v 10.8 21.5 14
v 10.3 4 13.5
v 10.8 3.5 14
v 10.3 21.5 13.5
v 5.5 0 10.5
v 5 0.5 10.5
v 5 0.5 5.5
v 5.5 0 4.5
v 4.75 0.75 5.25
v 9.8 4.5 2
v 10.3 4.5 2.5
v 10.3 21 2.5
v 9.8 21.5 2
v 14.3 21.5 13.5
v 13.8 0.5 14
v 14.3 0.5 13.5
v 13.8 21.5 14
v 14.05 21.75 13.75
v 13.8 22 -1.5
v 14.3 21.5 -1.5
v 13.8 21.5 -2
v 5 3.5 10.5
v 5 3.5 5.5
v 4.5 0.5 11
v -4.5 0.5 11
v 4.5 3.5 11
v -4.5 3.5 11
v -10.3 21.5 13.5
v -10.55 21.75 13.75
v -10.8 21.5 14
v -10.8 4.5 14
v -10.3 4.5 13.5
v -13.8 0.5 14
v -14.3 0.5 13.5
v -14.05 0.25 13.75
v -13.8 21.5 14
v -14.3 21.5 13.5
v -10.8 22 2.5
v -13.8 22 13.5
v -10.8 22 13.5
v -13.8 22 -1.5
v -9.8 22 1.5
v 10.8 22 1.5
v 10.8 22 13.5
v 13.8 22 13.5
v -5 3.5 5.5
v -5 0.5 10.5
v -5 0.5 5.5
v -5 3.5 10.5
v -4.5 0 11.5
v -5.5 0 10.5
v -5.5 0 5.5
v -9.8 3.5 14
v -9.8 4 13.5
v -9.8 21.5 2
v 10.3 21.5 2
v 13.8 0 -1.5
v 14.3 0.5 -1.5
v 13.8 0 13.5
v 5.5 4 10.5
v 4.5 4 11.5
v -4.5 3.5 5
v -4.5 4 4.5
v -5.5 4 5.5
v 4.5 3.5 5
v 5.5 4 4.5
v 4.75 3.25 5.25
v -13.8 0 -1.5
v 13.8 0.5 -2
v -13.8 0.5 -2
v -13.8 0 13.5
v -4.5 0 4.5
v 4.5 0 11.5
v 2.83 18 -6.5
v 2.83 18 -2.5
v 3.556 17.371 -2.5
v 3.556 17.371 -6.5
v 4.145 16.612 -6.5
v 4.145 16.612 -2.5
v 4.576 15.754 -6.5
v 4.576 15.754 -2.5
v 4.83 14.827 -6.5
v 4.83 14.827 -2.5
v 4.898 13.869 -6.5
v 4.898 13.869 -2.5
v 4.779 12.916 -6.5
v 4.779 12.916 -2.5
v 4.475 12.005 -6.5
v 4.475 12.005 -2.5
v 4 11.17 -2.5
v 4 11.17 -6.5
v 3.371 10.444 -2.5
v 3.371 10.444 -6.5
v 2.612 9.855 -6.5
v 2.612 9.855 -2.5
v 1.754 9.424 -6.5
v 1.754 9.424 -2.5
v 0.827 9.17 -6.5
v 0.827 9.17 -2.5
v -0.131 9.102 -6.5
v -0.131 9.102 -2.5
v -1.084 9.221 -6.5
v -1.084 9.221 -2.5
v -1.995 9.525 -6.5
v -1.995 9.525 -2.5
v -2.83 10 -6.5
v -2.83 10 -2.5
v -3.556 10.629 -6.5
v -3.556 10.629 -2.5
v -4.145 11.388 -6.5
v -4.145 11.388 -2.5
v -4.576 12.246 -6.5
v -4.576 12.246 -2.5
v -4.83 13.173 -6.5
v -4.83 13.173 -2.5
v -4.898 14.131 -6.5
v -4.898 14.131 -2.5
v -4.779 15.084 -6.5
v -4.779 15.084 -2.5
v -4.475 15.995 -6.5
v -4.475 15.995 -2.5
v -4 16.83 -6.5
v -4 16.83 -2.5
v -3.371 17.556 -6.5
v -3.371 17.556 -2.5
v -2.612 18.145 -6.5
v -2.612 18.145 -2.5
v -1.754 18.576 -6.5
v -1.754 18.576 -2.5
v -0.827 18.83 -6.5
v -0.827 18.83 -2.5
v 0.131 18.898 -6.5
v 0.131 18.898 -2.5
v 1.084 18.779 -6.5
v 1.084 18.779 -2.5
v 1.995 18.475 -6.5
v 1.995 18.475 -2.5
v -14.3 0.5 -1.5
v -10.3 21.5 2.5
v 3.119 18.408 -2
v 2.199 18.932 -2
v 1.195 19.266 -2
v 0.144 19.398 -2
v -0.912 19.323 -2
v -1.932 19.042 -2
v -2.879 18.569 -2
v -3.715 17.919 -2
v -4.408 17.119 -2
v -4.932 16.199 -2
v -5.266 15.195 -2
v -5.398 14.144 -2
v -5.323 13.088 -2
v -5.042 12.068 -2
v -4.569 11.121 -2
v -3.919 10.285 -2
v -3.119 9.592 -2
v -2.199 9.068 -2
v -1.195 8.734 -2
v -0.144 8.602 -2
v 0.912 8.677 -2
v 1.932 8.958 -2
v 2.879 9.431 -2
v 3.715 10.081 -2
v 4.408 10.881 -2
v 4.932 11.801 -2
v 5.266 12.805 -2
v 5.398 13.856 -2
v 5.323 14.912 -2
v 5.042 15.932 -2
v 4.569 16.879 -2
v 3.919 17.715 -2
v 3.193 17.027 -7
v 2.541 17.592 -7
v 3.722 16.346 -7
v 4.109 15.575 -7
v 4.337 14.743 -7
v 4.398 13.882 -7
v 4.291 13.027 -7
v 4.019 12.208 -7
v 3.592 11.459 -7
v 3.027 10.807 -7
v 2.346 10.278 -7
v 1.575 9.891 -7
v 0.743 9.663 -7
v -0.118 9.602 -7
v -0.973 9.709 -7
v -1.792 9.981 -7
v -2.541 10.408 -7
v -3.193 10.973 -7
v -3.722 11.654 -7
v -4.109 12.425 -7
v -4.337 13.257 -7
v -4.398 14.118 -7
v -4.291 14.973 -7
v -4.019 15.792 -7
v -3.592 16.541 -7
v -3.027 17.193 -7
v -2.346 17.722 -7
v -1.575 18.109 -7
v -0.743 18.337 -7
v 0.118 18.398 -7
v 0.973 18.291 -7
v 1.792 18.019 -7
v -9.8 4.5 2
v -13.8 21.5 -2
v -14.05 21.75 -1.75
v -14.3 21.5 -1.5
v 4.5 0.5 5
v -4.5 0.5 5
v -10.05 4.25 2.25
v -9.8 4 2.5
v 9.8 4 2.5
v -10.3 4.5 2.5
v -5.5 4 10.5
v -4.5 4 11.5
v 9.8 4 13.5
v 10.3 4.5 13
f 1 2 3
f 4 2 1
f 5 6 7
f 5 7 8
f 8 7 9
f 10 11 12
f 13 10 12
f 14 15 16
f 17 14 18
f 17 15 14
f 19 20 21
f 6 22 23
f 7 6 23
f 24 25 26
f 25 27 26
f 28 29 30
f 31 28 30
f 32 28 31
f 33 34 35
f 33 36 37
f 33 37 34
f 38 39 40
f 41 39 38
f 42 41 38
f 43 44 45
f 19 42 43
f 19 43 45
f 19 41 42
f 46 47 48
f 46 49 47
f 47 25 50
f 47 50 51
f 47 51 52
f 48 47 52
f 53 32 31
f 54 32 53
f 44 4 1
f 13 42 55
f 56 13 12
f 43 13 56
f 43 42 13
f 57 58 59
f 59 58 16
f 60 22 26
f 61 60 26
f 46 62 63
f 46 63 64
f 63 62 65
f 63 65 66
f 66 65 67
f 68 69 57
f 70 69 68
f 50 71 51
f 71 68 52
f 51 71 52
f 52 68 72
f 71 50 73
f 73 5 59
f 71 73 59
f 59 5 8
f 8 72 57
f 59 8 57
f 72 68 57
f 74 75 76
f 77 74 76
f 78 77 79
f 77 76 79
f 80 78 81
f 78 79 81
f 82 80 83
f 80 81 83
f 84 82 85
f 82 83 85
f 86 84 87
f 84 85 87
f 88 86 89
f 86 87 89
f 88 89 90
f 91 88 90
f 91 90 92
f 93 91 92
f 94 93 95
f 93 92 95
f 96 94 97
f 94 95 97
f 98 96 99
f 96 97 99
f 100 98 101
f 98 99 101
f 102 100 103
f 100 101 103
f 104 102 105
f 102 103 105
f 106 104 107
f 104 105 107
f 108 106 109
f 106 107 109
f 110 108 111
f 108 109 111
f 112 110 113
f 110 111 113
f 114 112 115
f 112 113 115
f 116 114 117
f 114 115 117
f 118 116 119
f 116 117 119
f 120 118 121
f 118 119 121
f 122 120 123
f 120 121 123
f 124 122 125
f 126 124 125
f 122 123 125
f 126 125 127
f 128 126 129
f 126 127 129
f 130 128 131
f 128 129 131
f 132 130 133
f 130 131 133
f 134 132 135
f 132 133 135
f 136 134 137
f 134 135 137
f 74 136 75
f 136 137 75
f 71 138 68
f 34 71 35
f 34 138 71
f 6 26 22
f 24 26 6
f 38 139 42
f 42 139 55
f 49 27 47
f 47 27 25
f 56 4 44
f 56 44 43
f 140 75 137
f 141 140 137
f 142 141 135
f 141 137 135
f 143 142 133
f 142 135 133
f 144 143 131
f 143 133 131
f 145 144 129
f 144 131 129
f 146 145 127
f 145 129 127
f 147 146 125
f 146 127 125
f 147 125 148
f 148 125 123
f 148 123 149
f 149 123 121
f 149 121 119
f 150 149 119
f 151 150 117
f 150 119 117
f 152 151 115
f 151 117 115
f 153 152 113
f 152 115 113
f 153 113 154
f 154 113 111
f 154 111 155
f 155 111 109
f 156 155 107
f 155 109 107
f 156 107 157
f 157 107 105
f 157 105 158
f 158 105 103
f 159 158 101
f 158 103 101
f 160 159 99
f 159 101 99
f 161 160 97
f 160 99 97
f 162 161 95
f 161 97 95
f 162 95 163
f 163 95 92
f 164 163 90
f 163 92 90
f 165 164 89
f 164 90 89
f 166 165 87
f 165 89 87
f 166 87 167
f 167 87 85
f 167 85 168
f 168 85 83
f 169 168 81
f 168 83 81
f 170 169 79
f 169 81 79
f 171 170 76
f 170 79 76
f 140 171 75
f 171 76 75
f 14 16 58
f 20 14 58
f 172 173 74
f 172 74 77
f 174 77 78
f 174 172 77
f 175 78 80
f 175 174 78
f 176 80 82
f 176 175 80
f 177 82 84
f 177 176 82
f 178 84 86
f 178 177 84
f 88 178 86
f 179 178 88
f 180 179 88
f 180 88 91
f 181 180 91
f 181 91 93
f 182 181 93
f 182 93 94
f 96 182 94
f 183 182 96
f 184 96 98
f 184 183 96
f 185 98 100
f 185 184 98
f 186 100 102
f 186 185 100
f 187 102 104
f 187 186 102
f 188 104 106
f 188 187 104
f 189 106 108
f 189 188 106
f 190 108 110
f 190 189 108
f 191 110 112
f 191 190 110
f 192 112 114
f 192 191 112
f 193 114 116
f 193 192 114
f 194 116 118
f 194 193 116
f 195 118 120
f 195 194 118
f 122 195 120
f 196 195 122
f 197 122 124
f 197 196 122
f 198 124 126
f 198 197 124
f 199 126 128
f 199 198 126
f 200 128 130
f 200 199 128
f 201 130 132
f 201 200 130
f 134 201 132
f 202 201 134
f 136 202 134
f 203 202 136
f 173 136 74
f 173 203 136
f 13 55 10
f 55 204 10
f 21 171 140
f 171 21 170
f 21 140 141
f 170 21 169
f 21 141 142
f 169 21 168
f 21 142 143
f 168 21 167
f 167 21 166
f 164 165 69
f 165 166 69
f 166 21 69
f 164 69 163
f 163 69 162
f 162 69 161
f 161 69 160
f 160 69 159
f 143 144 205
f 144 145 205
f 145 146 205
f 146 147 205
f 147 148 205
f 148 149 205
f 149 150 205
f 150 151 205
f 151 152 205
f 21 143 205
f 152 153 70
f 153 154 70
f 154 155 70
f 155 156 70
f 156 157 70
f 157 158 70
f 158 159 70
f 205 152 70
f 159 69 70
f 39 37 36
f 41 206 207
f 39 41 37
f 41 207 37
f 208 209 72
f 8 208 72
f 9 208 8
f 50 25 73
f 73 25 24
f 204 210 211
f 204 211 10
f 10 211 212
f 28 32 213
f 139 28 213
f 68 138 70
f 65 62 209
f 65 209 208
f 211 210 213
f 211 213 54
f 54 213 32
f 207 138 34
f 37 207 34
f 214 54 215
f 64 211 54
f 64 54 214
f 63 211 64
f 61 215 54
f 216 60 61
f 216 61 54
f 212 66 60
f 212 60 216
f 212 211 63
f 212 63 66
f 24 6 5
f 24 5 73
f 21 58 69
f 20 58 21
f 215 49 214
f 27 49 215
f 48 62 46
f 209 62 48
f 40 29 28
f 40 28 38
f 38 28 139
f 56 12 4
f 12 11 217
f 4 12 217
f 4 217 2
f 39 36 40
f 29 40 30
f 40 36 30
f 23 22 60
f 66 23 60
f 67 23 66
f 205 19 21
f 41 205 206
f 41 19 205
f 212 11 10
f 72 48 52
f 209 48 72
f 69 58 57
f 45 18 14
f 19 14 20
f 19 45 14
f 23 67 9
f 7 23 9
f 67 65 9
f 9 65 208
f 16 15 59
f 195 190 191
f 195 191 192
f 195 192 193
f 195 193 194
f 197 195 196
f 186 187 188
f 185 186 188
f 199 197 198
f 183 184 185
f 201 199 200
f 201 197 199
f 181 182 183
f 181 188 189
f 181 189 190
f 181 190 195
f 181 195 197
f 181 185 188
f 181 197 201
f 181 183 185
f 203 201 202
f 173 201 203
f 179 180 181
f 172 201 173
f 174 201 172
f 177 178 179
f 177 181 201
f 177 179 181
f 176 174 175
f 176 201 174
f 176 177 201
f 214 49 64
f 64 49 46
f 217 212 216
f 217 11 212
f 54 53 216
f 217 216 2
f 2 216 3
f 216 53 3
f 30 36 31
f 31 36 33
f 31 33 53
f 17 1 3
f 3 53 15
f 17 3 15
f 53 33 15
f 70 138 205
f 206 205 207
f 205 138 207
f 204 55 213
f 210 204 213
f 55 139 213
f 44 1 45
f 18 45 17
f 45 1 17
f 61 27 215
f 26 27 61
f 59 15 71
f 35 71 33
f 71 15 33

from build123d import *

# Parameters (mm, degrees)
SKETCH1_W           = 20.6
SKETCH1_H           = 4
BOSS_EXTRUDE1_DEPTH = 18
SKETCH2_W           = 16
SKETCH2_H           = 18
BOSS_EXTRUDE3_DEPTH = 4
SKETCH3_W           = 20.6
SKETCH3_H           = 4
BOSS_EXTRUDE4_DEPTH = 12
SKETCH4_R           = 4.9
BOSS_EXTRUDE5_DEPTH = 5
SKETCH5_W           = 10
SKETCH5_H           = 6
CUT_EXTRUDE1_DEPTH  = 10
BOSS_EXTRUDE6_DEPTH = 4
CHAMFER1_SIZE       = 0.5
CHAMFER2_SIZE       = 0.5


with BuildPart() as part:
    # Sketch1 → Boss-Extrude1 (new body)
    with BuildSketch(Plane(origin=(0, 0, 0), x_dir=(1, 0, 0), z_dir=(0, 1, 0))):
        Rectangle(SKETCH1_W, SKETCH1_H)
    extrude(amount=BOSS_EXTRUDE1_DEPTH)

    # Sketch2 → Boss-Extrude3 (add)
    with BuildSketch(Plane.ZY.offset(10.3)):
        with Locations((6, 9)):
            Rectangle(SKETCH2_W, SKETCH2_H)
    boss_extrude3 = extrude(amount=BOSS_EXTRUDE3_DEPTH)

    # Mirror1: Boss-Extrude3 across plane
    add(boss_extrude3.mirror(Plane.ZY))

    # Sketch3 → Boss-Extrude4 (add)
    with BuildSketch(Plane.XY.offset(2)):
        with Locations((0, 2)):
            Rectangle(SKETCH3_W, SKETCH3_H)
    extrude(amount=BOSS_EXTRUDE4_DEPTH)

    # Sketch4 → Boss-Extrude5 (add)
    with BuildSketch(Plane(origin=(0, 0, -2), x_dir=(-1, 0, 0), z_dir=(0, 0, -1))):
        with Locations(Location((0, 14, 0), (0, 0, 125.281261827))):
            Circle(SKETCH4_R)
    extrude(amount=BOSS_EXTRUDE5_DEPTH)

    # Sketch5 → Cut-Extrude1 (cut)
    with BuildSketch(Plane(origin=(0, 4, 0), x_dir=(1, 0, 0), z_dir=(0, 1, 0))):
        with Locations((0, -8)):
            Rectangle(SKETCH5_W, SKETCH5_H)
    extrude(amount=-CUT_EXTRUDE1_DEPTH, mode=Mode.SUBTRACT)

    # Sketch6 → Boss-Extrude6 (add)
    with BuildSketch(Plane(origin=(0, 18, 0), x_dir=(1, 0, 0), z_dir=(0, 1, 0))):
        Polygon((-10.3, -2), (10.3, -2), (10.3, -14), (14.3, -14), (14.3, 2), (2.83019434, 2), (-2.83019434, 2), (-14.3, 2), (-14.3, -14), (-10.3, -14), align=None)
    extrude(amount=BOSS_EXTRUDE6_DEPTH)

    # Chamfer1
    chamfer1_edges = [part.edges().sort_by_distance(p)[0] for p in [
        (0, 0, 14),
        (-14.3, 11, -2),
        (-14.3, 0, 6),
        (14.3, 11, -2),
        (14.3, 11, 14),
        (14.3, 0, 6),
        (-10.3, 13, 14),
        (0, 4, 14),
        (-10.3, 4, 8),
        (0, 0, -2),
        (-2.83019434, 10, -2),
        (-2.83019434, 10, -7),
        (5, 0, 8),
        (0, 0, 11),
        (5, 2, 11),
        (-5, 0, 8),
        (-5, 2, 11),
        (0, 0, 5),
        (-5, 2, 5),
        (5, 4, 8),
        (0, 4, 5),
        (-5, 4, 8),
        (0, 4, 11),
        (-10.3, 13, 2),
        (-10.3, 22, 8),
        (0, 22, 2),
        (14.3, 22, 6),
        (0, 22, -2),
    ]]
    chamfer(chamfer1_edges, length=CHAMFER1_SIZE)

    # Chamfer2
    chamfer2_edges = [part.edges().sort_by_distance(p)[0] for p in [
        (5, 2, 5),
        (10.3, 4, 7.75),
        (-14.3, 22, 6.25),
        (-14.3, 11.25, 14),
        (10.3, 12.75, 2),
        (10.3, 12.75, 14),
        (0.25, 4, 2),
        (10.3, 22, 7.75),
        (12.05, 22, 14),
        (-12.55, 22, 14),
    ]]
    chamfer(chamfer2_edges, length=CHAMFER2_SIZE - 0.0001)  # a hair under: the kernel refuses the full size


solid = part.part
